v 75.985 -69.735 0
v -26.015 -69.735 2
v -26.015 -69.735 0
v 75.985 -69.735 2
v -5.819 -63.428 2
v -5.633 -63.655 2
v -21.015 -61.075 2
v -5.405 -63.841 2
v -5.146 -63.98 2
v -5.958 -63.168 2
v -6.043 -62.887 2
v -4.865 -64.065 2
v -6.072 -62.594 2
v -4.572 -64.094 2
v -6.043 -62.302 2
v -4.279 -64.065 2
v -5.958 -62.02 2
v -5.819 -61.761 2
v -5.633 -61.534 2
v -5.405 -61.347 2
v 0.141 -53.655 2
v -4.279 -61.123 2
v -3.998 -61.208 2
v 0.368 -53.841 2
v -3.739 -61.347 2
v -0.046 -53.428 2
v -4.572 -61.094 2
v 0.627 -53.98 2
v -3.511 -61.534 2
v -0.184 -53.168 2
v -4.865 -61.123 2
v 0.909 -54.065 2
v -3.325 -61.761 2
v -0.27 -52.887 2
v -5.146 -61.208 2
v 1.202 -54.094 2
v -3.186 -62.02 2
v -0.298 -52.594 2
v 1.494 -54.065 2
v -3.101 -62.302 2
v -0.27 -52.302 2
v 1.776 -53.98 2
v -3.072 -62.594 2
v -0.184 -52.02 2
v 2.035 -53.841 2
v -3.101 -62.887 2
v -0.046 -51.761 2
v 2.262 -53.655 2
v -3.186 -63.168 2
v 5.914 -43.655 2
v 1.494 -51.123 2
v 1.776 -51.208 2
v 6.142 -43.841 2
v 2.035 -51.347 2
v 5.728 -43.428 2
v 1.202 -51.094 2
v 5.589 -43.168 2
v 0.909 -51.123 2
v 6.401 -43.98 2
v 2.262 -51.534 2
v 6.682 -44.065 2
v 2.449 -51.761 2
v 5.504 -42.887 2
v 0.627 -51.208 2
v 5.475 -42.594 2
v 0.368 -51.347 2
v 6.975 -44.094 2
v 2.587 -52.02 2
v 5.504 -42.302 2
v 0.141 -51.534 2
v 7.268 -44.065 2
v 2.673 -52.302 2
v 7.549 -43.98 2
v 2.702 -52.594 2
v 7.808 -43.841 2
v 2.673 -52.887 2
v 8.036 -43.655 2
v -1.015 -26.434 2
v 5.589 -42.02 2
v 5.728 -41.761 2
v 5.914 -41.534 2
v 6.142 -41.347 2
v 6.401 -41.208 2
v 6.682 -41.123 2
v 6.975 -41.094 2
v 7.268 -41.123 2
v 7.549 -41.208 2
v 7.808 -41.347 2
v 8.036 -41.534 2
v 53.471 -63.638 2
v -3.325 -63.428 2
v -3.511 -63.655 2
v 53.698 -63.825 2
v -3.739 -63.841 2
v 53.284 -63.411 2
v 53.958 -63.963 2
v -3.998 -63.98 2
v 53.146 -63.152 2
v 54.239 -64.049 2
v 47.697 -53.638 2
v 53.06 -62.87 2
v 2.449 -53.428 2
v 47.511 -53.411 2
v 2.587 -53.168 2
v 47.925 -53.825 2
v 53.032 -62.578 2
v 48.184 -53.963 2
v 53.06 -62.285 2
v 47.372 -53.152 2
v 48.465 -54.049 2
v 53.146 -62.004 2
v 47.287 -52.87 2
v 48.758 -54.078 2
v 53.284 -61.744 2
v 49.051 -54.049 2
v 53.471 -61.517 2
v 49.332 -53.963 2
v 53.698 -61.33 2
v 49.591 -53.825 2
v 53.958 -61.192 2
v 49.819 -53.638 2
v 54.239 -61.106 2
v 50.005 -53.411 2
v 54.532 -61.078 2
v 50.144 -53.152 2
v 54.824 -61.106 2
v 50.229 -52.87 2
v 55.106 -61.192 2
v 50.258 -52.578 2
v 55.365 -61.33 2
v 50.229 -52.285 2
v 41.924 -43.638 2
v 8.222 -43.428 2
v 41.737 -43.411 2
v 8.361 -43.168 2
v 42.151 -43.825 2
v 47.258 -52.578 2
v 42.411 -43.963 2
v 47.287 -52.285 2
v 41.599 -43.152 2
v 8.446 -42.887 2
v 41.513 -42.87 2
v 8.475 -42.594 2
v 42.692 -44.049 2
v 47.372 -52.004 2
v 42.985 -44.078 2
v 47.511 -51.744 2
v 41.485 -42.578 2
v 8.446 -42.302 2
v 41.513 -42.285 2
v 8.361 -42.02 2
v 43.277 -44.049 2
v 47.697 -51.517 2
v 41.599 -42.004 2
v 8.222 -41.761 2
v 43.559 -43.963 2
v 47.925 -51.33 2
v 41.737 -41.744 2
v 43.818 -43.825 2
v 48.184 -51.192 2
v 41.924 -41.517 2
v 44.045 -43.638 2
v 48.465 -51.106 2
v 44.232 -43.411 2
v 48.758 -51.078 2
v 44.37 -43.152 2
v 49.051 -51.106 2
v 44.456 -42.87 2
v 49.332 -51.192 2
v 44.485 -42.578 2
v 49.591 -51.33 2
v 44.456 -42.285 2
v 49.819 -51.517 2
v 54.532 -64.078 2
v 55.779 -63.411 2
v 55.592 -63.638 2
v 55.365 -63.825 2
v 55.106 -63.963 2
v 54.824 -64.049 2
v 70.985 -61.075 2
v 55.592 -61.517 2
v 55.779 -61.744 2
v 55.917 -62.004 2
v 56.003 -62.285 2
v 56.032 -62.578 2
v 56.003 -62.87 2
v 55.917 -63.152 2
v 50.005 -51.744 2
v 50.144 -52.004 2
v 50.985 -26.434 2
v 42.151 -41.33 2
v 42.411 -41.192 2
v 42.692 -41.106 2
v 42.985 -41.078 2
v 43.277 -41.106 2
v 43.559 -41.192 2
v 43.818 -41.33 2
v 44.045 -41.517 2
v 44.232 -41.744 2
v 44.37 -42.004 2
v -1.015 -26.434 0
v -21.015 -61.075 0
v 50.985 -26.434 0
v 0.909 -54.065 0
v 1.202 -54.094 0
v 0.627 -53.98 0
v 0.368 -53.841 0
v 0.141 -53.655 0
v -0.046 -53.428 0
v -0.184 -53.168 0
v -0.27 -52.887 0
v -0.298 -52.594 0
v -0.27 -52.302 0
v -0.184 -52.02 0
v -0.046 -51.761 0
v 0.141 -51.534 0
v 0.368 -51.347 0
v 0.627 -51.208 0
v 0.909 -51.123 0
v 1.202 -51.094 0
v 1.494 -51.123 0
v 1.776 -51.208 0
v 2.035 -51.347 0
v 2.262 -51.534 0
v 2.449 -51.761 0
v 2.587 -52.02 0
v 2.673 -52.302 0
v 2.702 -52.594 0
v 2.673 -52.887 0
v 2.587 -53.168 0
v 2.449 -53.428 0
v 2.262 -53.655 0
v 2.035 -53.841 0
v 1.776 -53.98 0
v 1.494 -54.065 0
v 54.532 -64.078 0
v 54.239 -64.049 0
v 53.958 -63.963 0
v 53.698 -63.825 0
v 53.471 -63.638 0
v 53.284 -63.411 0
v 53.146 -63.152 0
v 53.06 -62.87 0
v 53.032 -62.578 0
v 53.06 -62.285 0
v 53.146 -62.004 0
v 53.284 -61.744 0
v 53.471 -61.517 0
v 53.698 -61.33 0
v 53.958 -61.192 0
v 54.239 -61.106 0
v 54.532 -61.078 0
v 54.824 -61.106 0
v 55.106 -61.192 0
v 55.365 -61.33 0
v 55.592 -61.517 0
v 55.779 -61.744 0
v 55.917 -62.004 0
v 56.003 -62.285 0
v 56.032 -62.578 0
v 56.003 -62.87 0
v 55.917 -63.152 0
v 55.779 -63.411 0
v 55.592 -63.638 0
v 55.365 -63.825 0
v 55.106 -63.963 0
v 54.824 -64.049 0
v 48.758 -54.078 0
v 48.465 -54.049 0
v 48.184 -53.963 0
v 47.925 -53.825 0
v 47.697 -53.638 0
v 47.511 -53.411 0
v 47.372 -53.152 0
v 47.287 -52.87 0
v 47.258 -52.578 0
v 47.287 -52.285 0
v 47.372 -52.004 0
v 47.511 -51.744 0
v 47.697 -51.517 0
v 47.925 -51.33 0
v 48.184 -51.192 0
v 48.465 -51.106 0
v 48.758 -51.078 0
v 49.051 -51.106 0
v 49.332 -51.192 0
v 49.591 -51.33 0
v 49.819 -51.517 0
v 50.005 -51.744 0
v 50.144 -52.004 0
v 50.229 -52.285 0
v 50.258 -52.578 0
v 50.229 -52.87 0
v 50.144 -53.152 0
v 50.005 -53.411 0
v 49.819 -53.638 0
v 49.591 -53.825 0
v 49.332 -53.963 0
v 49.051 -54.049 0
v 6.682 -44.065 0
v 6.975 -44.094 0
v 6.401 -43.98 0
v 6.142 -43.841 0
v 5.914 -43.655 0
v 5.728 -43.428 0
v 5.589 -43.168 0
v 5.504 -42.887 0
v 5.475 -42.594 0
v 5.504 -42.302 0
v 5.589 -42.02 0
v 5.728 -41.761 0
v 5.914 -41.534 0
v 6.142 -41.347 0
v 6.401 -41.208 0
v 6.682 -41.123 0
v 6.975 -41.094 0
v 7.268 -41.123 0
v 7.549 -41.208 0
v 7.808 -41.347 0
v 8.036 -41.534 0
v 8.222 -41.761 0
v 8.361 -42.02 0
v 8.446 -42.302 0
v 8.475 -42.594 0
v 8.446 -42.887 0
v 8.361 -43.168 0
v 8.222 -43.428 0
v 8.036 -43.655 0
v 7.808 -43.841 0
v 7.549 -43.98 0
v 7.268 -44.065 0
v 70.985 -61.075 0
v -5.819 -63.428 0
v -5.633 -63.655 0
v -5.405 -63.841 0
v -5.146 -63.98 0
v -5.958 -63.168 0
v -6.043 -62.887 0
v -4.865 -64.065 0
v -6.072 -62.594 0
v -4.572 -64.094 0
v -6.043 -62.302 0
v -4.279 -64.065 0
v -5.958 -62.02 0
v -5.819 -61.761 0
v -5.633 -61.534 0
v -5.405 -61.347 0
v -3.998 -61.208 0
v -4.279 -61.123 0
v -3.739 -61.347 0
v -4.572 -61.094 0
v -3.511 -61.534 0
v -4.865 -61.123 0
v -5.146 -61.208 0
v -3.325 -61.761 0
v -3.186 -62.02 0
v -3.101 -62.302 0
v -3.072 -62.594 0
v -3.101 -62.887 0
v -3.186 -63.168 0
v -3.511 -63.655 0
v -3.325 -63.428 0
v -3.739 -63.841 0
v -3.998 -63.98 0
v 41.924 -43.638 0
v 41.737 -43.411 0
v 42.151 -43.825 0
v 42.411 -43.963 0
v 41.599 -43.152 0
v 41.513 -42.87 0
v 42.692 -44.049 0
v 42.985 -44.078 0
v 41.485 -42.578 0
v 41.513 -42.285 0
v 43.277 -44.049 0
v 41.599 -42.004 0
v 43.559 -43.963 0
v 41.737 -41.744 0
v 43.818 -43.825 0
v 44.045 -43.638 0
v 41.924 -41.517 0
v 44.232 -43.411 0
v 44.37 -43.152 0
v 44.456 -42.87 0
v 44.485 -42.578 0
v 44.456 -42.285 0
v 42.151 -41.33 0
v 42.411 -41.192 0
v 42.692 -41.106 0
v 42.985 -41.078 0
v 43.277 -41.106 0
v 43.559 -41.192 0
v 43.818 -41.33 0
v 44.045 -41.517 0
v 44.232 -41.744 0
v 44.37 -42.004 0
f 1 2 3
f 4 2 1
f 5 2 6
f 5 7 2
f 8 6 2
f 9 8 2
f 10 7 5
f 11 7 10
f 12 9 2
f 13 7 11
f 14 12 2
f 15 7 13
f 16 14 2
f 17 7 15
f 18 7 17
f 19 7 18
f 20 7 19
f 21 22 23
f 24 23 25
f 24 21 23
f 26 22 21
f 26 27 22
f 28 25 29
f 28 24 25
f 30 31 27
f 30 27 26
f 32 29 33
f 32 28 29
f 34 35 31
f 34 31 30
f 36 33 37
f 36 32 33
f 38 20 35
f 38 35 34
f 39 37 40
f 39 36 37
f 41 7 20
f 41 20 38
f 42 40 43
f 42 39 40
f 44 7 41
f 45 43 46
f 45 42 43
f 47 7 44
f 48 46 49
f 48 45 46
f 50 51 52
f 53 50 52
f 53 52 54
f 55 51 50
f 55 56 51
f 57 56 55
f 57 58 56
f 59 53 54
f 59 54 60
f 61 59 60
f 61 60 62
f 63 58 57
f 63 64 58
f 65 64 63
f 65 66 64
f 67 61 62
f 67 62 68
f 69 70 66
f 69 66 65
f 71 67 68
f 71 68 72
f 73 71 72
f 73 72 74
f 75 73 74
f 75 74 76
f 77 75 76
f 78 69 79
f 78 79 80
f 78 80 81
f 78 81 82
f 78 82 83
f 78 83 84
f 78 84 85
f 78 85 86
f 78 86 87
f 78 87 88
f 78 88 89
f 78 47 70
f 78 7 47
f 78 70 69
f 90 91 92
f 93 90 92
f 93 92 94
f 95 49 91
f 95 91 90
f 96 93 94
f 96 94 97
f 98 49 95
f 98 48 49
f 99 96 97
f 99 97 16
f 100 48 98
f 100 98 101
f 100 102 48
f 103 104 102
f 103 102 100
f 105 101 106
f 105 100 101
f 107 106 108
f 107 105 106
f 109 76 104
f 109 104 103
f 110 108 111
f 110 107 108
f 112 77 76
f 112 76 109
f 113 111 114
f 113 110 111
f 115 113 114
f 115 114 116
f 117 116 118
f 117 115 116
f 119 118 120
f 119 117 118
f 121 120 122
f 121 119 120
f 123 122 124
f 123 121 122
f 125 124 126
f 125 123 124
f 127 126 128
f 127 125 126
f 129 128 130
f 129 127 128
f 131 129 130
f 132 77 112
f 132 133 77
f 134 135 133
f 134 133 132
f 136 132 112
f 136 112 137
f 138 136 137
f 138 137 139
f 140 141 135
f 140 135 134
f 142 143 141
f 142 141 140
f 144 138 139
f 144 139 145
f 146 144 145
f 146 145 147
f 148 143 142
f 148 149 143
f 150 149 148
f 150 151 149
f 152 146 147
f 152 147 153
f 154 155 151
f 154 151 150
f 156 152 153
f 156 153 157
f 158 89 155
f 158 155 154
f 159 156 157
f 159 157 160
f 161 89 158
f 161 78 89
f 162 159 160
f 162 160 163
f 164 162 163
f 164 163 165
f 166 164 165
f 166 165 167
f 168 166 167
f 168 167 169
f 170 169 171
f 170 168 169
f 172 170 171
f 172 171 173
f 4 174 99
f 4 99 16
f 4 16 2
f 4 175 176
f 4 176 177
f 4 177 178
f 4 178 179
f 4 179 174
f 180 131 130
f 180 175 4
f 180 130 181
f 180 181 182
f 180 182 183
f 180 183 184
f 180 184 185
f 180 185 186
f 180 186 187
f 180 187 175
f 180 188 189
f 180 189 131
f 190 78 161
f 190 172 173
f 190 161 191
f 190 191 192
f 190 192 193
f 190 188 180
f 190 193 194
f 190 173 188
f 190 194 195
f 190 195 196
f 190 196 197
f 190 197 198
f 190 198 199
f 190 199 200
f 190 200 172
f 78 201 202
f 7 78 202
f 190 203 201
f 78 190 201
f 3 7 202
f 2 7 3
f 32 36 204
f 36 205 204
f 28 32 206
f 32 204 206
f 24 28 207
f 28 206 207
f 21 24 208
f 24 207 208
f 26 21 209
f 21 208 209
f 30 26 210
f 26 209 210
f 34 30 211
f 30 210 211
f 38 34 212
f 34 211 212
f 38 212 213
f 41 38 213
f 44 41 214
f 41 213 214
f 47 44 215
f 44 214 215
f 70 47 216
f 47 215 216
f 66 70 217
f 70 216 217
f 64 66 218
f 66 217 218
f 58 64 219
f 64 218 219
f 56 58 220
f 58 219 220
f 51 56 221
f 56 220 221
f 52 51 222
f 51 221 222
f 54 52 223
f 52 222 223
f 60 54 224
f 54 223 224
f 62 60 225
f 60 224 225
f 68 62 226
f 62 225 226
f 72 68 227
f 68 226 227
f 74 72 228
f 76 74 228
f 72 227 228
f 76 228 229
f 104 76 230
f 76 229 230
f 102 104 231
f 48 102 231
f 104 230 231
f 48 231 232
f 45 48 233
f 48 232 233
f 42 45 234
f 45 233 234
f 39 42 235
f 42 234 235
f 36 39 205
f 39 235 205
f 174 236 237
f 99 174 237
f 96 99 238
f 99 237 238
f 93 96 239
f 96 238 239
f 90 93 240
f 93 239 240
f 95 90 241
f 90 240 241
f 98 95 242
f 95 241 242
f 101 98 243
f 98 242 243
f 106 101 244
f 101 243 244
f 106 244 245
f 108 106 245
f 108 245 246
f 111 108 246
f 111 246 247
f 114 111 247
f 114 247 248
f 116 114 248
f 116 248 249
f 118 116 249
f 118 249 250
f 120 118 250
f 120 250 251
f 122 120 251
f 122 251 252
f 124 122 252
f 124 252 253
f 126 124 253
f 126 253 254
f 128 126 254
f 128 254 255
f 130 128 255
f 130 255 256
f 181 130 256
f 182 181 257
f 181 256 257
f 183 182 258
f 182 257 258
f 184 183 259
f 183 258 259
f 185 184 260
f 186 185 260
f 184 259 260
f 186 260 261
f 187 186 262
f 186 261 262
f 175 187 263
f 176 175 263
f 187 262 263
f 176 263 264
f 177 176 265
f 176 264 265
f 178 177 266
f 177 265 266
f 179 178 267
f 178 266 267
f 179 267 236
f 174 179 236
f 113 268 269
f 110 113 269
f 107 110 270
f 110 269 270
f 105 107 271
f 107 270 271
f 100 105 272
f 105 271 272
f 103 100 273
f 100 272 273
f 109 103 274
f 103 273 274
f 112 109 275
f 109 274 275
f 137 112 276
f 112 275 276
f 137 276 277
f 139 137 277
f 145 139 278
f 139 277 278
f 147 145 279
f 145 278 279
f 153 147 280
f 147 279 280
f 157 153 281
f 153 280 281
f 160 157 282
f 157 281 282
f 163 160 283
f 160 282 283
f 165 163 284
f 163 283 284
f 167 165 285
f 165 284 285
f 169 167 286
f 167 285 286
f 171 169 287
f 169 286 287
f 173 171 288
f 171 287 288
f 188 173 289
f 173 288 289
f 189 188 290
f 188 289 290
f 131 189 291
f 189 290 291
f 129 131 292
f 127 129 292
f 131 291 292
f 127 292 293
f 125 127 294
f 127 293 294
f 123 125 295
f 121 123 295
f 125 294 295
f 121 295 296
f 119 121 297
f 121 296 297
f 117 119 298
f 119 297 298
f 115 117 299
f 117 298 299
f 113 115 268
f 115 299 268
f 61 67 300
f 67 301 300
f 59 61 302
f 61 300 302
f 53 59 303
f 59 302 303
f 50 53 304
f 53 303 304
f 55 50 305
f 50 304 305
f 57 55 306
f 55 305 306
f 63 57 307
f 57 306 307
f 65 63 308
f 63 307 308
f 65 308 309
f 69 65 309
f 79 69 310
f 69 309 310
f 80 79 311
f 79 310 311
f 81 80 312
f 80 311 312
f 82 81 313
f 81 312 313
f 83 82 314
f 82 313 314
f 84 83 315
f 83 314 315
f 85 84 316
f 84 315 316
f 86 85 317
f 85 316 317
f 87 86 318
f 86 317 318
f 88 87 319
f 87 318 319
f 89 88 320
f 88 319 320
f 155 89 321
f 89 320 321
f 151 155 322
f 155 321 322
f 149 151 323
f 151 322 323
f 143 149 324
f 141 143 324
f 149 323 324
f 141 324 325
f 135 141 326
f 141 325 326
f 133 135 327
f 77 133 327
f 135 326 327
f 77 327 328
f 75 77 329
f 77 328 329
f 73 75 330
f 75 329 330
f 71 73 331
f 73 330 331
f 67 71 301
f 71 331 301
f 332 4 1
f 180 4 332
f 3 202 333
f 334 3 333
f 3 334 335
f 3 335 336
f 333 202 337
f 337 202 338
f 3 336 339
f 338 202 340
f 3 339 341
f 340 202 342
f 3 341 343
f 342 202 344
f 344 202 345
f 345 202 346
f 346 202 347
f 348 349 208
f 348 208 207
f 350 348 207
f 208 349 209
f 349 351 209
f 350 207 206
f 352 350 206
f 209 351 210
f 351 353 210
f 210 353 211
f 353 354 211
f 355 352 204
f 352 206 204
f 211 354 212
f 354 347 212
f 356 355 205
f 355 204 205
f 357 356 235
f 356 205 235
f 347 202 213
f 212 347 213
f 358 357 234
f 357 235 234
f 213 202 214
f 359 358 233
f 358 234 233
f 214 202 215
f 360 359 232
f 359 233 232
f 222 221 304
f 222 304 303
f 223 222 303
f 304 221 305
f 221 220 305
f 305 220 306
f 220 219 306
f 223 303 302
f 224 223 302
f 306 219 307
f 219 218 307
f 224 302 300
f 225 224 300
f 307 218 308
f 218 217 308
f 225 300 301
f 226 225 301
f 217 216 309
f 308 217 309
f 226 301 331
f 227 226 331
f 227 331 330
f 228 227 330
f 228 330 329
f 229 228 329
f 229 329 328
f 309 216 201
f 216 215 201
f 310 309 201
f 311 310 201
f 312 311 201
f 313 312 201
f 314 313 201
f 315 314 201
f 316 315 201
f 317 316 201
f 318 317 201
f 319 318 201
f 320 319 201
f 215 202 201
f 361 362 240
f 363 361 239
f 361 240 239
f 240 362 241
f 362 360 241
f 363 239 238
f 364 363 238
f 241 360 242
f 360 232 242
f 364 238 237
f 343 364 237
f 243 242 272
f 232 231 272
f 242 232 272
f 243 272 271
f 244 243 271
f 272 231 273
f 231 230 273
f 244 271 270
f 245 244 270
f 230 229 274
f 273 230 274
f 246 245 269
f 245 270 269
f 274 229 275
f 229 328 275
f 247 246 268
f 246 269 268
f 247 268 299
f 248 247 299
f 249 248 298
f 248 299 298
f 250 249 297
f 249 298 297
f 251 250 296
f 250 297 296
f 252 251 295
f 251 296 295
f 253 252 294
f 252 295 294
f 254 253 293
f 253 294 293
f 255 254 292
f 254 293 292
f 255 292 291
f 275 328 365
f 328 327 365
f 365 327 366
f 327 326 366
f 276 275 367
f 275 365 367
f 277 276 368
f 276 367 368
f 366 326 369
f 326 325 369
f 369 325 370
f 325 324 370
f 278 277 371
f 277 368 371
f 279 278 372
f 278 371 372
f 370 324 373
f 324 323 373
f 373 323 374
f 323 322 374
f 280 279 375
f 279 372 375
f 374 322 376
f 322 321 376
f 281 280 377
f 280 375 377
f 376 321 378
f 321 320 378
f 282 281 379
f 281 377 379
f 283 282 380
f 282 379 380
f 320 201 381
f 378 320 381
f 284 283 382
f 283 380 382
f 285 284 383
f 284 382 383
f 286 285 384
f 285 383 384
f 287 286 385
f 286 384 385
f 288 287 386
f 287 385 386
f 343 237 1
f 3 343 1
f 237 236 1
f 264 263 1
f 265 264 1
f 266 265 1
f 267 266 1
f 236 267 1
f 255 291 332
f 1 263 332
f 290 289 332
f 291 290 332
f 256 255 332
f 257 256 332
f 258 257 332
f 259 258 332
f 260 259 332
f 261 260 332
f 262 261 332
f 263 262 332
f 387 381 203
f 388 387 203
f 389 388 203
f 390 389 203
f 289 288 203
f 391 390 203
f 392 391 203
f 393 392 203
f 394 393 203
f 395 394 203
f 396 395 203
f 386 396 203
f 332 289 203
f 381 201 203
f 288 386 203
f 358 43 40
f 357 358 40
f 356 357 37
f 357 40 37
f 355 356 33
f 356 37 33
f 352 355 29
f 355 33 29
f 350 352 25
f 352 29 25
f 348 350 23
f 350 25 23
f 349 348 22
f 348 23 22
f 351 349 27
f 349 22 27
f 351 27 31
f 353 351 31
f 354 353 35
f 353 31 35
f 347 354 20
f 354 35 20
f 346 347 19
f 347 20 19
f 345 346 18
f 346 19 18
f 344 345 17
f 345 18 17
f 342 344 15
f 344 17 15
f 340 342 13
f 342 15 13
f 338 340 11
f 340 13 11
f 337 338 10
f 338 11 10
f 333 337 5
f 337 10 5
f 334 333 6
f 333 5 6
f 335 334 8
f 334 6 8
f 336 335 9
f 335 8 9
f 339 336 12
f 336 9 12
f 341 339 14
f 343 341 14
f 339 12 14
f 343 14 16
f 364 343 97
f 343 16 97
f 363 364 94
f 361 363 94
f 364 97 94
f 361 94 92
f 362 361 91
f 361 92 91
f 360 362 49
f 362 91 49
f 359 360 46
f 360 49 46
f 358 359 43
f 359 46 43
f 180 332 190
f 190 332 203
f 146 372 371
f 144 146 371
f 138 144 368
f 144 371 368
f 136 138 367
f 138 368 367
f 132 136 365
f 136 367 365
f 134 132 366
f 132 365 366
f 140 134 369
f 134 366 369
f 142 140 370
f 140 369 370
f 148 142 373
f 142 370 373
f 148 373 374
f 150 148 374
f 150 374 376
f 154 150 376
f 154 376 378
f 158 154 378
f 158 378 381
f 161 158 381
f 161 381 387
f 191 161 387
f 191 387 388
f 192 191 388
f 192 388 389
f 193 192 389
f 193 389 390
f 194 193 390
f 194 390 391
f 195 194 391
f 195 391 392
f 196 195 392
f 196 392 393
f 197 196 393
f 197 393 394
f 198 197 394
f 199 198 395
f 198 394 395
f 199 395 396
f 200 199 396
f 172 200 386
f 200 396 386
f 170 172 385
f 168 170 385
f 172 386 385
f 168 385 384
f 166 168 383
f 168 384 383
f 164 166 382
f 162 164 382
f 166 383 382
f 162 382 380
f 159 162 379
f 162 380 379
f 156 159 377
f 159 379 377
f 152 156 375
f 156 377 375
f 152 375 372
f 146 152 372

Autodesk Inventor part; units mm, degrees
ref_plane "YZ Plane" through (0, 0, 0) normal (1, 0, 0) x (0, 1, 0)
ref_plane "XZ Plane" through (0, 0, 0) normal (0, 1, 0) x (-1, 0, 0)
ref_plane "XY Plane" through (0, 0, 0) normal (0, 0, 1) x (1, 0, 0)
sketch "スケッチ1" plane through (0, 0, 0) normal (0, 0, 1) x (1, 0, 0)
  line L0 (-21.0154, -61.075) -> (70.9846, -61.075)
  line L1 (70.9846, -61.075) -> (50.9846, -26.434)
  line L2 (50.9846, -26.434) -> (-1.0154, -26.434)
  line L3 (-1.0154, -26.434) -> (-21.0154, -61.075)
  point P0 (0, 0)
  dimension "d0" = 92
  dimension "d1" = 40
  dimension "d2" = 60
  dimension "d3" = 52
extrude "押し出し1" add sketch "スケッチ1" along normal blind 2
sketch "スケッチ2" plane through (0, 0, 2) normal (0, 0, 1) x (1, 0, 0)
  circle A0 centre (6.975, -42.5942) radius 1.5
  line L0 (-1.0154, -26.434) -> (-21.0154, -61.075) projected
  line L1 (50.9846, -26.434) -> (-1.0154, -26.434) projected
  line L2 (-1.0154, -26.434) -> (24.9653, -41.434)
  line L3 (-1.0154, -26.434) -> (28.9846, -26.434) construction
  line L4 (70.9846, -61.075) -> (50.9846, -26.434) projected
  line L5 (50.9846, -26.434) -> (24.9751, -41.4506)
  circle A1 centre (1.2015, -52.5942) radius 1.5
  circle A2 centre (-4.572, -62.5942) radius 1.5
  line L6 (-21.0154, -61.075) -> (70.9846, -61.075) projected
  line L7 (-21.0154, -61.075) -> (-26.0154, -69.7352)
  line L8 (-21.0154, -61.075) -> (-11.0154, -61.075) construction
  line L9 (-26.0154, -69.7352) -> (75.9846, -69.7352)
  line L10 (75.9846, -69.7352) -> (70.9846, -61.075)
  point P0 (0, 0)
  dimension "d6" = 3
  dimension "d7" = 15
  dimension "d8" = 30
  dimension "d9" = 30
  dimension "d10" = 10
  dimension "d11" = 3
  dimension "d12" = 3
  dimension "d13" = 10
  dimension "d14" = 15
  dimension "d15" = 10
  dimension "d16" = 120
  dimension "d17" = 60
  dimension "d18" = 10
  dimension "d19" = 15
extrude "押し出し2" add sketch "スケッチ2" against normal blind 2 contours L6 L10 L9 L7
sketch "スケッチ3" plane through (0, 0, 2) normal (0, 0, 1) x (1, 0, 0)
  line L0 (-1.0154, -26.434) -> (-26.0154, -69.7352) projected
  line L1 (-1.0154, -26.434) -> (24.9653, -41.434)
  line L2 (-1.0154, -26.434) -> (28.9846, -26.434) construction
  line L3 (24.9653, -41.434) -> (50.9461, -26.434)
  circle A0 centre (6.975, -42.5942) radius 1.5
  circle A1 centre (1.2015, -52.5942) radius 1.5
  circle A2 centre (42.9846, -42.5776) radius 1.5
  circle A3 centre (48.7581, -52.5776) radius 1.5
  circle A4 centre (54.5316, -62.5776) radius 1.5
  line L4 (75.9846, -69.7352) -> (50.9846, -26.434) projected
  point P0 (0, 0)
  dimension "d22" = 30
  dimension "d23" = 30
  dimension "d24" = 120
  dimension "d25" = 3
  dimension "d26" = 15
  dimension "d27" = 10
  dimension "d28" = 3
  dimension "d29" = 15
  dimension "d30" = 10
  dimension "d31" = 3
  dimension "d32" = 3
  dimension "d33" = 3
  dimension "d34" = 15
  dimension "d35" = 15
  dimension "d36" = 15
  dimension "d37" = 10
  dimension "d38" = 10
  dimension "d39" = 10
hole "穴1" at (1.2015, -52.5942, 2) at (6.975, -42.5942, 2) at (42.9846, -42.5776, 2) at (54.5316, -62.5776, 2) at (48.7581, -52.5776, 2) direction (0, 0, -1) diameter 3 depth 2
equation "\"BendRadius\" = Thickness"
equation "\"BendReliefWidth\" = Thickness"
equation "\"BendReliefDepth\" = 0.5 * Thickness"
equation "\"CornerReliefSize\" = 4 * Thickness"
equation "\"MinimumRemnant\" = 2 * Thickness"
equation "\"TransitionRadius\" = BendRadius"
equation "\"JacobiRadiusSize\" = BendRadius"
equation "\"GapSize\" = Thickness"
equation "\"Thickness\" = 0.5"
properties part number "nhk22" material "アルミニウム 6061"
